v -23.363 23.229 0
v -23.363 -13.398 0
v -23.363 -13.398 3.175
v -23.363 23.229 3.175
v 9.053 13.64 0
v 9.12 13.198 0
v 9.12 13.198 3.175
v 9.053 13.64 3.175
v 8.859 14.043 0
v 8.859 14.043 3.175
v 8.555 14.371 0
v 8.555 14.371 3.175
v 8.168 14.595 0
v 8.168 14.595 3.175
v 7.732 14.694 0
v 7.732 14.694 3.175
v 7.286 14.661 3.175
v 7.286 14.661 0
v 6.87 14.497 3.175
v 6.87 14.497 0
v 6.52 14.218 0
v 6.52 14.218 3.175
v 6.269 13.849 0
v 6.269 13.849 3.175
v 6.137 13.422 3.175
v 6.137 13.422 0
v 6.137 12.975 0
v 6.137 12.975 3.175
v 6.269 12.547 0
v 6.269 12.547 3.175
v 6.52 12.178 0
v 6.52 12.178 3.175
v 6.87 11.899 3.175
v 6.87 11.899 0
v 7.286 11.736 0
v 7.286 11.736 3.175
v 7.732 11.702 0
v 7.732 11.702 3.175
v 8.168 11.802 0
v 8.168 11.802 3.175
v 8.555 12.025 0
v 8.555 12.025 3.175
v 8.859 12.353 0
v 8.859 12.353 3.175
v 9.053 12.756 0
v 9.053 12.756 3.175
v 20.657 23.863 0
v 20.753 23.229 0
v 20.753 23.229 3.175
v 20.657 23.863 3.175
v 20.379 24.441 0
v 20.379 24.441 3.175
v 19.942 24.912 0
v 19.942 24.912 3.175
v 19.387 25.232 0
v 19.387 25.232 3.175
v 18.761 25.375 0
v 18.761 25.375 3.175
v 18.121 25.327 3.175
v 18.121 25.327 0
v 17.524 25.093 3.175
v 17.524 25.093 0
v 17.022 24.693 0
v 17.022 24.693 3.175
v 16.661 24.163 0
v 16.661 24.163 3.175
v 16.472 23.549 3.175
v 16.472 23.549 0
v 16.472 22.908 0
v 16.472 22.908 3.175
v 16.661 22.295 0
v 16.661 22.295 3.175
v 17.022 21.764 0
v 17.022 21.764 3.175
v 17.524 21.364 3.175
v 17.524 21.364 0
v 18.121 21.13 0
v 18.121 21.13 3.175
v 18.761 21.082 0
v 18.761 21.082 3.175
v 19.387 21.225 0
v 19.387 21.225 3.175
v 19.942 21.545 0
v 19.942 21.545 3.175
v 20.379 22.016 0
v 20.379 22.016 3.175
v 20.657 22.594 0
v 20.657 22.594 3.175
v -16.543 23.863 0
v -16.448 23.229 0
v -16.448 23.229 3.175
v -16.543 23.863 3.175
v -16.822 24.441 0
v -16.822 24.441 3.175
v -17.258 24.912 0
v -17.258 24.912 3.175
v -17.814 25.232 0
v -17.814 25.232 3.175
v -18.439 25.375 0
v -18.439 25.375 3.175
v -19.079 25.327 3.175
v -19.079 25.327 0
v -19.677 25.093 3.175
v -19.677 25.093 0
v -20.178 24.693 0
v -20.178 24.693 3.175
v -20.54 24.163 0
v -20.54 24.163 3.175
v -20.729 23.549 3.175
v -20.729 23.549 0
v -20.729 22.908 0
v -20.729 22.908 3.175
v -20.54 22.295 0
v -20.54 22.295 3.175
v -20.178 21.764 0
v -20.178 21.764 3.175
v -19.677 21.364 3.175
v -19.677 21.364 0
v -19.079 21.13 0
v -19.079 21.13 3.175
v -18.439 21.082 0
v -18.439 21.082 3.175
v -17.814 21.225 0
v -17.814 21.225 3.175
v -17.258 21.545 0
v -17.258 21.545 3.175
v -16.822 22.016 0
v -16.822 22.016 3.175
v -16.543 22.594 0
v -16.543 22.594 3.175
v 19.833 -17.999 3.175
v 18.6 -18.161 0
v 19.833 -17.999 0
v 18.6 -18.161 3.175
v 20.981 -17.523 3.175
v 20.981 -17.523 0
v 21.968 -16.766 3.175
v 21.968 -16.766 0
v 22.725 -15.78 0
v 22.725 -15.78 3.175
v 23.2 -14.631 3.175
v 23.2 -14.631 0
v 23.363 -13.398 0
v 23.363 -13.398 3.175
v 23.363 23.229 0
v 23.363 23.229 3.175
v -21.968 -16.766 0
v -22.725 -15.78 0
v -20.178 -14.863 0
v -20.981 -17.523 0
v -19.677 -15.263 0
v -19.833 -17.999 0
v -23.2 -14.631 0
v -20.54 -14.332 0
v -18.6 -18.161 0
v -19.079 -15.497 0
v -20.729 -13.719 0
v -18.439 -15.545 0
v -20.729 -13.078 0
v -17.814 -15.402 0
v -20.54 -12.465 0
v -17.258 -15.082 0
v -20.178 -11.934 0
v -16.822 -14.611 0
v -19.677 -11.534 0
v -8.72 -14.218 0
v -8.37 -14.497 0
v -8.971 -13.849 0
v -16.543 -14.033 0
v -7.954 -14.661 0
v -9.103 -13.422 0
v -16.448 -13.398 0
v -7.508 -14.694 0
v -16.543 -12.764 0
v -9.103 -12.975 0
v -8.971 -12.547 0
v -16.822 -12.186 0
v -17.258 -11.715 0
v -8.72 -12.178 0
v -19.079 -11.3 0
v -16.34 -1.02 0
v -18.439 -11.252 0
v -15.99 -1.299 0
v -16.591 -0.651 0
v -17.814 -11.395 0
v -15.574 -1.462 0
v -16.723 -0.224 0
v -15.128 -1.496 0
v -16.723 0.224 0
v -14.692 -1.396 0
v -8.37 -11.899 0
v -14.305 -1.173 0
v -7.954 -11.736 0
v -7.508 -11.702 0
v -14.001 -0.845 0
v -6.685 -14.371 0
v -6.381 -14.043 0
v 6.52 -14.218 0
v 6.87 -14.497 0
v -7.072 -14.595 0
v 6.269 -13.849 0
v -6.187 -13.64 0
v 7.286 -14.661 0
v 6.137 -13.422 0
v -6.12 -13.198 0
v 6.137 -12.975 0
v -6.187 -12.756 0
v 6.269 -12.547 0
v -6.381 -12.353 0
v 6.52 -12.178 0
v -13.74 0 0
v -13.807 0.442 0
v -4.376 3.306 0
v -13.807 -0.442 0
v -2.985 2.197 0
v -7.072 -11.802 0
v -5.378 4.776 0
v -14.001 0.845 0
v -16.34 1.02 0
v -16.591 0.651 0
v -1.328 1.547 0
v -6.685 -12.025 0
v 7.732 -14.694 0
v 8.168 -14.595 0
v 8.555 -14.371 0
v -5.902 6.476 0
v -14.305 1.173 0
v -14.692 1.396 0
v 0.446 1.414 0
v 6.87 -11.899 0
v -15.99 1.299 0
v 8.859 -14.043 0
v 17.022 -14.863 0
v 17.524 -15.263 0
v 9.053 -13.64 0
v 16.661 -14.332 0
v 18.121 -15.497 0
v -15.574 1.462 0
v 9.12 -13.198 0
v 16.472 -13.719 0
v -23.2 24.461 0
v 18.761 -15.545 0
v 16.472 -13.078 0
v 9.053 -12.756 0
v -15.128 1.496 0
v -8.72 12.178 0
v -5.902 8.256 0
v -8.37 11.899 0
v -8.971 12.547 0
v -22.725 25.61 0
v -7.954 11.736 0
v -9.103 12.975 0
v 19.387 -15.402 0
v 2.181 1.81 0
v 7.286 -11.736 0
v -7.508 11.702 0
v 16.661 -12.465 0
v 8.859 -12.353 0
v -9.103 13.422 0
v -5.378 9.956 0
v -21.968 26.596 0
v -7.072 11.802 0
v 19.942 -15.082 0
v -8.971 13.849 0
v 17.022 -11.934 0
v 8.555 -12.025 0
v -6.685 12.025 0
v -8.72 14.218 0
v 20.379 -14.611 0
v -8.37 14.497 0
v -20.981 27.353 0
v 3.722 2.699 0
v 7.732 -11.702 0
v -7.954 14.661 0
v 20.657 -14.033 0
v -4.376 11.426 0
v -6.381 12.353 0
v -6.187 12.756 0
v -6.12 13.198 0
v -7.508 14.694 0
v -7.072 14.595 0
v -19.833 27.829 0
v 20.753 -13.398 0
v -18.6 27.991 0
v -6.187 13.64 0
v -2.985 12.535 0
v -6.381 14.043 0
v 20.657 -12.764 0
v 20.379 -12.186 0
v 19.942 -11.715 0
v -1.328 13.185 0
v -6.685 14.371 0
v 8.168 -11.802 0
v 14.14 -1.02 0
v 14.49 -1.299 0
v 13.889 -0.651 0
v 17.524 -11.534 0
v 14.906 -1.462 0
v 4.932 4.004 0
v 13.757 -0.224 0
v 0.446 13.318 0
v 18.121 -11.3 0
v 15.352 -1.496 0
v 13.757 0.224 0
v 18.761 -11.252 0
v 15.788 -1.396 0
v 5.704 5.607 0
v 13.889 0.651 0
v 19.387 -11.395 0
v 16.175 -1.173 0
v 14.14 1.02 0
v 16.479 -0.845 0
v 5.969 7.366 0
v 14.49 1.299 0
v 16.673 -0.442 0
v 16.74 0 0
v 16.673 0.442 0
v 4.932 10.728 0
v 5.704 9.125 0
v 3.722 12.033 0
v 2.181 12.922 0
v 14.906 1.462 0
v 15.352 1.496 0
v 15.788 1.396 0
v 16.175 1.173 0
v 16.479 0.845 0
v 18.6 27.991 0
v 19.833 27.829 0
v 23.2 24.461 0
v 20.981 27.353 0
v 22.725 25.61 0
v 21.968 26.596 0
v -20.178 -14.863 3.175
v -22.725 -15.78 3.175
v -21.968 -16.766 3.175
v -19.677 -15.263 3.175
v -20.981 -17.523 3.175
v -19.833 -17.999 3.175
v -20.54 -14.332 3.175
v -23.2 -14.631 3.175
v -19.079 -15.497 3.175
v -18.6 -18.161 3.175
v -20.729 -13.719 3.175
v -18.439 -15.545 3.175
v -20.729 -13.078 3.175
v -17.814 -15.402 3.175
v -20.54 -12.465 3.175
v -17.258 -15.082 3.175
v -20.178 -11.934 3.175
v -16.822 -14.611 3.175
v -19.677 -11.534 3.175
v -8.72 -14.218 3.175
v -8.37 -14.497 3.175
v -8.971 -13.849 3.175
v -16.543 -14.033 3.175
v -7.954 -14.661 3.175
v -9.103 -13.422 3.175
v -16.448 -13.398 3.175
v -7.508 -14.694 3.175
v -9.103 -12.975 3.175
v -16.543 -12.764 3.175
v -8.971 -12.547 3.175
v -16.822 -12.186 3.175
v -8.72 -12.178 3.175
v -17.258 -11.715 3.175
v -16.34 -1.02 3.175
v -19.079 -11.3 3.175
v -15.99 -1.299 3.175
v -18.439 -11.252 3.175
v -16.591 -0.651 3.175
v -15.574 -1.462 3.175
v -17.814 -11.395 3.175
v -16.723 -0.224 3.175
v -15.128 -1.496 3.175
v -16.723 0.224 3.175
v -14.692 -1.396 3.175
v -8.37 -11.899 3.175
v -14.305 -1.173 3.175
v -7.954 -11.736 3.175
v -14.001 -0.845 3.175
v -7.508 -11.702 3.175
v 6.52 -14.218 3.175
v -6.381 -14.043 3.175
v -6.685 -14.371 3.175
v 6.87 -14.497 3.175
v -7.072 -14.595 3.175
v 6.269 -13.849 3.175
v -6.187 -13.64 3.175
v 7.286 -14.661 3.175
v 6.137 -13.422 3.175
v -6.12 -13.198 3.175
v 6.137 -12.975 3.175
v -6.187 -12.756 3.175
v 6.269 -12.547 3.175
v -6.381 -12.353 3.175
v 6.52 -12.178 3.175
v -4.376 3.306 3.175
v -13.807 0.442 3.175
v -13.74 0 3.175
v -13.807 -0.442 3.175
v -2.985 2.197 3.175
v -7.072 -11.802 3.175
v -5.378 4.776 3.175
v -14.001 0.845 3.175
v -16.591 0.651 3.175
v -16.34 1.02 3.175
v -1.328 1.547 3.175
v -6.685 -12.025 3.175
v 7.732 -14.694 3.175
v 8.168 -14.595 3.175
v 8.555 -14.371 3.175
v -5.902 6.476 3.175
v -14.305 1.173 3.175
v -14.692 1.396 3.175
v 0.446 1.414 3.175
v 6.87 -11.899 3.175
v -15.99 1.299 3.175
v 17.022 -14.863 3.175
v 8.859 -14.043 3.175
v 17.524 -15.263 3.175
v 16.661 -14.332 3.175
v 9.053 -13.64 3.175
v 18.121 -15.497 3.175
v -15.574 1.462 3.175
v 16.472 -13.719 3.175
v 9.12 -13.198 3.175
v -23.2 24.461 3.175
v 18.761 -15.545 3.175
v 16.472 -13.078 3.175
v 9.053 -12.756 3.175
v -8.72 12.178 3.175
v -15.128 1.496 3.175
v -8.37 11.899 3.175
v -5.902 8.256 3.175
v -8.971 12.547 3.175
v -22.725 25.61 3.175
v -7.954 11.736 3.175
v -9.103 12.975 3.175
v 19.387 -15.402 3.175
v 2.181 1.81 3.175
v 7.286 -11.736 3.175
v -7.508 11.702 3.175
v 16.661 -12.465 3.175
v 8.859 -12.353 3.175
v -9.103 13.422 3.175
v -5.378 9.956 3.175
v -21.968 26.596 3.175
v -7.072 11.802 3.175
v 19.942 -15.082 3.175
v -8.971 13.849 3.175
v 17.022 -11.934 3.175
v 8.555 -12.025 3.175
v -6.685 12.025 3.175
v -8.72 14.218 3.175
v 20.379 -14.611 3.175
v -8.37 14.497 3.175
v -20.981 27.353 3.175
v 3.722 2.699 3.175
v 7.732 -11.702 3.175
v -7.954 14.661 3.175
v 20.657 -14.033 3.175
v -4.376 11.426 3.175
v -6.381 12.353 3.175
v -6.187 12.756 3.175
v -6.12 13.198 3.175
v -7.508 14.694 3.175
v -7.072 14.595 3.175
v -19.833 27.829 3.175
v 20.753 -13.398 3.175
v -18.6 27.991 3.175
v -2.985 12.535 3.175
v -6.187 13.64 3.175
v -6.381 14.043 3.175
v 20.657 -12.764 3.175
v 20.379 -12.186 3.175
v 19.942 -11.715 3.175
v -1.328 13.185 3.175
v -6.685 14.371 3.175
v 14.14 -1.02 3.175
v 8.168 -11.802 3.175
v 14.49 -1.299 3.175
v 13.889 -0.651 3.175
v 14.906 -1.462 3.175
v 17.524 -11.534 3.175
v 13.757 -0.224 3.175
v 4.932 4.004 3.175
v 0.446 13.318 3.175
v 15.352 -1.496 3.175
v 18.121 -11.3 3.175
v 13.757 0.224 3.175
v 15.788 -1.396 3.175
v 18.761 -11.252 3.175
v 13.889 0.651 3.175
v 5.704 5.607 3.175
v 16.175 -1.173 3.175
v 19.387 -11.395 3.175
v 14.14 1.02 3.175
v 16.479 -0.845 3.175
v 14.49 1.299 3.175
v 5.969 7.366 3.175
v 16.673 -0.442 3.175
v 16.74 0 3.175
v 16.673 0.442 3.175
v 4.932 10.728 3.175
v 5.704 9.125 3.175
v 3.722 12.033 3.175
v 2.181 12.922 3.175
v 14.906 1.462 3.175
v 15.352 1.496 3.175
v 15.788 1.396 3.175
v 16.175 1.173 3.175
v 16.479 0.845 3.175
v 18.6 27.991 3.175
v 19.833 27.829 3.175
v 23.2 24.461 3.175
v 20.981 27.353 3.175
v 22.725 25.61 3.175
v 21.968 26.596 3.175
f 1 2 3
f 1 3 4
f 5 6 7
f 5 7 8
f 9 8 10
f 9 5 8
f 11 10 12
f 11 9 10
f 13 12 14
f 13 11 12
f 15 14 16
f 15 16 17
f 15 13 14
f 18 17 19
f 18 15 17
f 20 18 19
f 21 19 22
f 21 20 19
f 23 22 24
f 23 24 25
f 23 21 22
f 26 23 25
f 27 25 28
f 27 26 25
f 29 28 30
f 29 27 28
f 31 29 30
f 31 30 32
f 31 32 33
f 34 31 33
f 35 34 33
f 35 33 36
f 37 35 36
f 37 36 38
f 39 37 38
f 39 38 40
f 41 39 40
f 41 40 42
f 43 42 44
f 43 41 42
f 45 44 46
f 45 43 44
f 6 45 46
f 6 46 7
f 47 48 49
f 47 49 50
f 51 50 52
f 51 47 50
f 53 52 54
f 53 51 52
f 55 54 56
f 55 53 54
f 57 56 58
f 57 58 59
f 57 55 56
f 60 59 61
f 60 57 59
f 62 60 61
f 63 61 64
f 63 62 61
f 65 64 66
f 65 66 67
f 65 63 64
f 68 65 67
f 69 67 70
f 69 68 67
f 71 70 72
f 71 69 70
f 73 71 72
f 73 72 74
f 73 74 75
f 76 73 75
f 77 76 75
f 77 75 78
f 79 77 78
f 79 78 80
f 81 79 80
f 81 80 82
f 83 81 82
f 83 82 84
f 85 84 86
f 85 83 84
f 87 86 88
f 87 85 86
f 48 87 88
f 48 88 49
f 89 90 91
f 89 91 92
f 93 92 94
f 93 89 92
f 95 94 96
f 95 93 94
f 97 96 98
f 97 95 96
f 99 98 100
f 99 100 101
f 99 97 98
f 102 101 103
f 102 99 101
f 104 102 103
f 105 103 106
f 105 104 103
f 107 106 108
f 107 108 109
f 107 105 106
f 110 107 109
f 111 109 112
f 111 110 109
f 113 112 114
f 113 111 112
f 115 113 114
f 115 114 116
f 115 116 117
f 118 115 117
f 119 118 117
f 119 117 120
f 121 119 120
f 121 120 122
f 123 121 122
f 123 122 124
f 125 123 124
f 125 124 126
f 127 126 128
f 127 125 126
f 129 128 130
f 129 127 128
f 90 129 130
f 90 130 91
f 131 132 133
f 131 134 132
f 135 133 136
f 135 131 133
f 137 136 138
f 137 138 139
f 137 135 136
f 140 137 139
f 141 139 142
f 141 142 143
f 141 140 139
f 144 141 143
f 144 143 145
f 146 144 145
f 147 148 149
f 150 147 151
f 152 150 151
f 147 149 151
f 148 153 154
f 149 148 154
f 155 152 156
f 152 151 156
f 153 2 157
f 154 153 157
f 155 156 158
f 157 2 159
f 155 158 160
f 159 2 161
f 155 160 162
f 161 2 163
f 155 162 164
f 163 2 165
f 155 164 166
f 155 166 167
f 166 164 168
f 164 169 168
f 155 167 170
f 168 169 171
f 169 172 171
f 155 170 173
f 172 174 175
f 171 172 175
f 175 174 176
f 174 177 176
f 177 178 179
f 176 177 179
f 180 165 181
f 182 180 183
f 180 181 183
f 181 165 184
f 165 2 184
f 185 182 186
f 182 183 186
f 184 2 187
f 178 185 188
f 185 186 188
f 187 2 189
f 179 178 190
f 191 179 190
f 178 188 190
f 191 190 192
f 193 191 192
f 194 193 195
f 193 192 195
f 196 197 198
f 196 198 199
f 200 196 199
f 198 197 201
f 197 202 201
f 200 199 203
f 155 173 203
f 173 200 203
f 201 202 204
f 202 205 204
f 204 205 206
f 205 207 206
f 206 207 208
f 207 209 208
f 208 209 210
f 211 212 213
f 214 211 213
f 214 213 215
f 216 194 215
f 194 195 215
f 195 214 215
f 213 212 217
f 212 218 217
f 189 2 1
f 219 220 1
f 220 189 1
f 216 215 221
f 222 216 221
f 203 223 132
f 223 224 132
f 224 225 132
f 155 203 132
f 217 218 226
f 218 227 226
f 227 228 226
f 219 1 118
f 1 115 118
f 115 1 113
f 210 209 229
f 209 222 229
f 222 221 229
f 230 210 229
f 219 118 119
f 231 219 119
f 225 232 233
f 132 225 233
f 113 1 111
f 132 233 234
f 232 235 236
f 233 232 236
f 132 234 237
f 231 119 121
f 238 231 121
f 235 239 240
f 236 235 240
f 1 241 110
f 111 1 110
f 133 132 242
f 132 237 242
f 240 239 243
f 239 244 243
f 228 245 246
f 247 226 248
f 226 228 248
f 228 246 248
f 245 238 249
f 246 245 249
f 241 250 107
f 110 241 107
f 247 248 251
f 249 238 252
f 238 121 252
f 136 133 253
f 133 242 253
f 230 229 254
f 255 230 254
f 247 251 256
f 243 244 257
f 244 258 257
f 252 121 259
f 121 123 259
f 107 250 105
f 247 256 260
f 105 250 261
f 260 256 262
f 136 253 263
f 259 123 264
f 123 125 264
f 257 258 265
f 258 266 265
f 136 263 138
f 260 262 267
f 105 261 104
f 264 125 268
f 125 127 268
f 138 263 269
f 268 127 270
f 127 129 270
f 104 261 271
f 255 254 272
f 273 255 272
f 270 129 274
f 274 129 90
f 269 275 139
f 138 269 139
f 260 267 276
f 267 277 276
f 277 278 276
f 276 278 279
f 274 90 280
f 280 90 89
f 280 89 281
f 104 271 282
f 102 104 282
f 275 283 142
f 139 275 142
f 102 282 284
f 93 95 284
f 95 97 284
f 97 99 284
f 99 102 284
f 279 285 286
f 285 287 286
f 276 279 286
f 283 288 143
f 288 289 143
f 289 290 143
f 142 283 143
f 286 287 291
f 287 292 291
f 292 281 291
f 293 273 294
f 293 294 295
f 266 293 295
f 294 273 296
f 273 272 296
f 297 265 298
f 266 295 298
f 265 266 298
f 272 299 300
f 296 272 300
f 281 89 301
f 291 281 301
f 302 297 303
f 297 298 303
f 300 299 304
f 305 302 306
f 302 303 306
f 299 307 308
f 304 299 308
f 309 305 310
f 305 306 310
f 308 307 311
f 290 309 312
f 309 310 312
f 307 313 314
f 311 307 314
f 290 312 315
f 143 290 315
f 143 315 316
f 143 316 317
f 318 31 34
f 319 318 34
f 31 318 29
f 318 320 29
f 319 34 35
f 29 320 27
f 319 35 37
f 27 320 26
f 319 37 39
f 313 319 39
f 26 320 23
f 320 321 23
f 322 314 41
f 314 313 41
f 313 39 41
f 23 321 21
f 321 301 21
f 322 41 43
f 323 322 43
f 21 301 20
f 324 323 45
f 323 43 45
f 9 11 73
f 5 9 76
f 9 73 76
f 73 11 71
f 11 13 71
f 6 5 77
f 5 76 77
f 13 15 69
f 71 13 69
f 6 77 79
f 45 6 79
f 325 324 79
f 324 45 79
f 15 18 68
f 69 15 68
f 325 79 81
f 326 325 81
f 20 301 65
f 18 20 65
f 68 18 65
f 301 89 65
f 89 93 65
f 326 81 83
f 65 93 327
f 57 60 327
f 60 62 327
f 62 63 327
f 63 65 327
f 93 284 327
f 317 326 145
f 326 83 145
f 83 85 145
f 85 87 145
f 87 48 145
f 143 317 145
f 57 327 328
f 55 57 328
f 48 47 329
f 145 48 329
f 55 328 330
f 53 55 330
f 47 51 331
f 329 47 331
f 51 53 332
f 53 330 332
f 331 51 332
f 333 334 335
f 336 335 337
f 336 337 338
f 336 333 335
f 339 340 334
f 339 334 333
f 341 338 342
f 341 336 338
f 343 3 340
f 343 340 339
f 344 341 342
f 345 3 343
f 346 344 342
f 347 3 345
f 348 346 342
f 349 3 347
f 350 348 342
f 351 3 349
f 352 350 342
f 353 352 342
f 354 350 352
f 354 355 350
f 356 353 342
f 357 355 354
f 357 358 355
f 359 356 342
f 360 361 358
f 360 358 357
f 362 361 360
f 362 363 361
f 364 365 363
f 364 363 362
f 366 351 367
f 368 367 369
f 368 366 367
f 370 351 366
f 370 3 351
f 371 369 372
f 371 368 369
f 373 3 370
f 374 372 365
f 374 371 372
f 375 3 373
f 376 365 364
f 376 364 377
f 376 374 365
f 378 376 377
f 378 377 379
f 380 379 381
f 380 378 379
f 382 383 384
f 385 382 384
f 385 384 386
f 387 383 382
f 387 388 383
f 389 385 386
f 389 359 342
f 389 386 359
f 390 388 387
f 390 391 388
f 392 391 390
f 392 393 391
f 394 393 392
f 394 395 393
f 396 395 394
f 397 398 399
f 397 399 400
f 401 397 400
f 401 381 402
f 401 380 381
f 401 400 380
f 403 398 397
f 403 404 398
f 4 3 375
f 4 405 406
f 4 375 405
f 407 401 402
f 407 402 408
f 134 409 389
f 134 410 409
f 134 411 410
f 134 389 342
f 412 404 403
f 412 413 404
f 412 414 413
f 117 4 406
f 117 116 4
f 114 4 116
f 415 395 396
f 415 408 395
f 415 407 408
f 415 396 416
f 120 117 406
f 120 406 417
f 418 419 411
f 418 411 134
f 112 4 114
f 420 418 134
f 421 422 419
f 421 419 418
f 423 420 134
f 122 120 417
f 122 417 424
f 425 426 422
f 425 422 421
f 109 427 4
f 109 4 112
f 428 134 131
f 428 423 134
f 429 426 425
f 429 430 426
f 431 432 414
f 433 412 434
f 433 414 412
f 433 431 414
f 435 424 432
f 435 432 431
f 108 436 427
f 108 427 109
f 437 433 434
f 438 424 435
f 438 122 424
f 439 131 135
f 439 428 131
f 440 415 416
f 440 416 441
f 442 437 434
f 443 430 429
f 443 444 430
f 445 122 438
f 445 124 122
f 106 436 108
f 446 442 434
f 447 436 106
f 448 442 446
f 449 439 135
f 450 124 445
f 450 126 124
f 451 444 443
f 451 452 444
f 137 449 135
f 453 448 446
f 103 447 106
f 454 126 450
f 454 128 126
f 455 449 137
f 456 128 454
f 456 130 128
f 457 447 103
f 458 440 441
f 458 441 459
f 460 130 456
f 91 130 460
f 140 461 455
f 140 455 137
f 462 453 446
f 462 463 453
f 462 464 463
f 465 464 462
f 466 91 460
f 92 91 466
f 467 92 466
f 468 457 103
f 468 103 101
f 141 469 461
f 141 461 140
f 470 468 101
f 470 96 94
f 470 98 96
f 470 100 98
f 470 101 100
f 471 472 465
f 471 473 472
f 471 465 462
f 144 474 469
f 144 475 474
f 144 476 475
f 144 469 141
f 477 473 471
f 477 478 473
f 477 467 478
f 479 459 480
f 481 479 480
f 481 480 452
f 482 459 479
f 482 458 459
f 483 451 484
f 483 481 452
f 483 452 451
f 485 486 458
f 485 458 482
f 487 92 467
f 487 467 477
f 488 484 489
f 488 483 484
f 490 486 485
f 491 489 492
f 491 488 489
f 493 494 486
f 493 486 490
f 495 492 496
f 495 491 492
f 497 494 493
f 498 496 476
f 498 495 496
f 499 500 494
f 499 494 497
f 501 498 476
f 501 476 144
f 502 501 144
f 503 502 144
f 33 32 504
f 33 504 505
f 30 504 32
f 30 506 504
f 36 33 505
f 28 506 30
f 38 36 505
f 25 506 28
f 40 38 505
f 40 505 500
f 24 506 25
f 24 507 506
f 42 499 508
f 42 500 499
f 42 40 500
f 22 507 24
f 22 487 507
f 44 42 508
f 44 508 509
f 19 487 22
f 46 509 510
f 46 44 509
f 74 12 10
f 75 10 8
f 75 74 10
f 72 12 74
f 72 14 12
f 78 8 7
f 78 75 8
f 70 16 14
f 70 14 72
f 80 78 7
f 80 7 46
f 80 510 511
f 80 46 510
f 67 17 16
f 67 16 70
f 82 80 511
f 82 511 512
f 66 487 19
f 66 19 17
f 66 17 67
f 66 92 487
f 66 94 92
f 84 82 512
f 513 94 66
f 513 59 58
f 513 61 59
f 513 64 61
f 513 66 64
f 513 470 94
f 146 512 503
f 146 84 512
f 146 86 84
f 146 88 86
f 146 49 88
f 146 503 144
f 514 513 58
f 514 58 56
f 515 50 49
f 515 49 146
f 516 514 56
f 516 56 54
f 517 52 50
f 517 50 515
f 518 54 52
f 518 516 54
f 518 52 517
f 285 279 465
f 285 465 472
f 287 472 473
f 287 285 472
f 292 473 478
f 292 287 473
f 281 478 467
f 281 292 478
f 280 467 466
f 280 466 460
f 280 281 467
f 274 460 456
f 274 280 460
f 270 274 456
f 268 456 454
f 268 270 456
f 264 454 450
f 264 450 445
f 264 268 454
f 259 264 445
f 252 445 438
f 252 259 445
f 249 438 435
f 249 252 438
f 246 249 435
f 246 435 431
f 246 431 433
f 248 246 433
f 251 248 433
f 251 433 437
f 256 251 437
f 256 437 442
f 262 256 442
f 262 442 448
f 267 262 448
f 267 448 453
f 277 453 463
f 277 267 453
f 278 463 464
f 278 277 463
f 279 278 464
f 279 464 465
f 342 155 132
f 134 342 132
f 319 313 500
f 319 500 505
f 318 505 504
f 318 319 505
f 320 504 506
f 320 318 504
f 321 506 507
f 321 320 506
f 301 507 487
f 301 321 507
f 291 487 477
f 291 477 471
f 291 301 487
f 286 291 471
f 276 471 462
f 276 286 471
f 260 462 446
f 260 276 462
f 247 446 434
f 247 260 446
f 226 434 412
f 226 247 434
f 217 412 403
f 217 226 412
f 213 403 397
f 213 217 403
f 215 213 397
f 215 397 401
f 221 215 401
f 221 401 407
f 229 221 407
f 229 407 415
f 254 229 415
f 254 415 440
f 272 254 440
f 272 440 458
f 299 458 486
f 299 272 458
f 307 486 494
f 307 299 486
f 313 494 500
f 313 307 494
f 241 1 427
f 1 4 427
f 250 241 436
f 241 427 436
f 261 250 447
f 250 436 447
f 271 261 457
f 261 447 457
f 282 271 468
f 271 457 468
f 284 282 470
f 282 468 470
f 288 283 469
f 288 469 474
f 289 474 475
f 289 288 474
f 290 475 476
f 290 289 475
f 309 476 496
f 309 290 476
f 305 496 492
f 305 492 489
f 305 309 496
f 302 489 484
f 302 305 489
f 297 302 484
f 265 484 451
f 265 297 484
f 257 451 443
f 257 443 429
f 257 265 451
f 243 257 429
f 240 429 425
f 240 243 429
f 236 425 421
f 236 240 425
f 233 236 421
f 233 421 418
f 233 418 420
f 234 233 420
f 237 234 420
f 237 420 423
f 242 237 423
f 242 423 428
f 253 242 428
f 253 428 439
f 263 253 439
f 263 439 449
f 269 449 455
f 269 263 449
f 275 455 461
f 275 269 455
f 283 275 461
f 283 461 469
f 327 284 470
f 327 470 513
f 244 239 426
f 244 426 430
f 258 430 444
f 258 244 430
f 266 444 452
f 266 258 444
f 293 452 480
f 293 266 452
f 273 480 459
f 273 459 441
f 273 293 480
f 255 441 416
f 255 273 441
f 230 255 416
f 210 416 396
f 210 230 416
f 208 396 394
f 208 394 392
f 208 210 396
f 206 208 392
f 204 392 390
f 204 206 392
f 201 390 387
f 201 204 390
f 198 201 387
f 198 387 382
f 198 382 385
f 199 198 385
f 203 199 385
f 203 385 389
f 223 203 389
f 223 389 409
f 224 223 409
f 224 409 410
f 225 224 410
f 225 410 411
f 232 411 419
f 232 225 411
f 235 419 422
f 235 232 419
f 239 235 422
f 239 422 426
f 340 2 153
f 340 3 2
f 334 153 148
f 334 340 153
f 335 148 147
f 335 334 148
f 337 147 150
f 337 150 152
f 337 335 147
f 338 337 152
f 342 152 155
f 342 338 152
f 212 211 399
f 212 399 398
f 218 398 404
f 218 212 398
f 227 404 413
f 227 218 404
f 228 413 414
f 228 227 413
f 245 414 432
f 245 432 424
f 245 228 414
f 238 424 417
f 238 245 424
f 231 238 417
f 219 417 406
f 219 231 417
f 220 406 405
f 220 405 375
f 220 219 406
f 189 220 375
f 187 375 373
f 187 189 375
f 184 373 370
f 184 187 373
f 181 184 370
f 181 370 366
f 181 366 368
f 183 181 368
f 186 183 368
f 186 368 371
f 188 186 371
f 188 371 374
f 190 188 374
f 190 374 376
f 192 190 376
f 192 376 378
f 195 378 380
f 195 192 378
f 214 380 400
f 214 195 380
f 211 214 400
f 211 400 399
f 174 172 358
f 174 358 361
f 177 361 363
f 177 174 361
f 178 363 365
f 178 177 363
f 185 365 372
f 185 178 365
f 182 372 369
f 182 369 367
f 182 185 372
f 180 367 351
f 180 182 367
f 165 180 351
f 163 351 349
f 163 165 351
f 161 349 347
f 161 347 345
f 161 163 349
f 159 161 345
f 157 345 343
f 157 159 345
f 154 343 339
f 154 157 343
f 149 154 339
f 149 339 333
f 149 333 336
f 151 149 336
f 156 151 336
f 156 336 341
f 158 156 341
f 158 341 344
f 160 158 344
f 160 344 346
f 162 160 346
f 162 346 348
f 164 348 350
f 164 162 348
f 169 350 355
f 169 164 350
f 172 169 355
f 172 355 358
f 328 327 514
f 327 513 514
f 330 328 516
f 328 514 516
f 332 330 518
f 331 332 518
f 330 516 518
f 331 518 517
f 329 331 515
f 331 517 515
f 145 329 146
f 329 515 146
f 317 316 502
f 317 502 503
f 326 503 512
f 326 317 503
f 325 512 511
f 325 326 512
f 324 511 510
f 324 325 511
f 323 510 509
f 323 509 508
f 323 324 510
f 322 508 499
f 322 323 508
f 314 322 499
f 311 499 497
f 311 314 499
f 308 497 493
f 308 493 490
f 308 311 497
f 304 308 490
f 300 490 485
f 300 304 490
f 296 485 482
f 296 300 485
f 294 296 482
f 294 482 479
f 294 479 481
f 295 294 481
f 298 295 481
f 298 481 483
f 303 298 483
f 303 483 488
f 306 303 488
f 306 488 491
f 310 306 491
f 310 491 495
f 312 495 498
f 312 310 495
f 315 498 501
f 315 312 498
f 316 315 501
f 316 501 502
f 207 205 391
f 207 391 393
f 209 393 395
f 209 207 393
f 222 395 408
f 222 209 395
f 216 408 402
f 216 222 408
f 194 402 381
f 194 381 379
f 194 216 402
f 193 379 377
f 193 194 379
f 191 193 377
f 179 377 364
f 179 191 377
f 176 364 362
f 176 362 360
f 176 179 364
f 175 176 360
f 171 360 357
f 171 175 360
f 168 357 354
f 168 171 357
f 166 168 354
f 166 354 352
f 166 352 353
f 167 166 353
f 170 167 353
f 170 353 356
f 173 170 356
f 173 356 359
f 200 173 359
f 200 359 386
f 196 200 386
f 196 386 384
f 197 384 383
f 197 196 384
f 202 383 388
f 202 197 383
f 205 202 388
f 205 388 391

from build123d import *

# Parameters (mm, degrees)
F0_W     = 46.72538
F0_H     = 46.152003
F0_R     = 2.15265
F0_R_2   = 1.5
F0_R_3   = 5.969
F1_DEPTH = 3.175
F2_R     = 4.7625


with BuildPart() as f1:
    # F0 (on Top) → F1 (new body)
    with BuildSketch(Plane.XY):
        with Locations((0, 4.915002)):
            Rectangle(F0_W, F0_H)
        with Locations((-18.60019, -13.3985)):
            Circle(F0_R, mode=Mode.SUBTRACT)
        with Locations((-7.62, -13.198227)):
            Circle(F0_R_2, mode=Mode.SUBTRACT)
        with Locations((-15.24, 0)):
            Circle(F0_R_2, mode=Mode.SUBTRACT)
        with Locations((7.62, -13.198227)):
            Circle(F0_R_2, mode=Mode.SUBTRACT)
        with Locations((18.60019, -13.3985)):
            Circle(F0_R, mode=Mode.SUBTRACT)
        with Locations((15.24, 0)):
            Circle(F0_R_2, mode=Mode.SUBTRACT)
        with Locations((0, 7.366)):
            Circle(F0_R_3, mode=Mode.SUBTRACT)
        with Locations((-7.62, 13.198227)):
            Circle(F0_R_2, mode=Mode.SUBTRACT)
        with Locations((-18.60019, 23.228503)):
            Circle(F0_R, mode=Mode.SUBTRACT)
        with Locations((7.62, 13.198227)):
            Circle(F0_R_2, mode=Mode.SUBTRACT)
        with Locations((18.60019, 23.228503)):
            Circle(F0_R, mode=Mode.SUBTRACT)
    extrude(amount=F1_DEPTH)

    # F2
    f2_edges = [f1.edges().sort_by_distance(p)[0] for p in [
        (-23.36269, -18.161, 1.5875),
        (23.36269, -18.161, 1.5875),
        (23.36269, 27.991003, 1.5875),
        (-23.36269, 27.991003, 1.5875),
    ]]
    fillet(f2_edges, radius=F2_R)


solid = f1.part
